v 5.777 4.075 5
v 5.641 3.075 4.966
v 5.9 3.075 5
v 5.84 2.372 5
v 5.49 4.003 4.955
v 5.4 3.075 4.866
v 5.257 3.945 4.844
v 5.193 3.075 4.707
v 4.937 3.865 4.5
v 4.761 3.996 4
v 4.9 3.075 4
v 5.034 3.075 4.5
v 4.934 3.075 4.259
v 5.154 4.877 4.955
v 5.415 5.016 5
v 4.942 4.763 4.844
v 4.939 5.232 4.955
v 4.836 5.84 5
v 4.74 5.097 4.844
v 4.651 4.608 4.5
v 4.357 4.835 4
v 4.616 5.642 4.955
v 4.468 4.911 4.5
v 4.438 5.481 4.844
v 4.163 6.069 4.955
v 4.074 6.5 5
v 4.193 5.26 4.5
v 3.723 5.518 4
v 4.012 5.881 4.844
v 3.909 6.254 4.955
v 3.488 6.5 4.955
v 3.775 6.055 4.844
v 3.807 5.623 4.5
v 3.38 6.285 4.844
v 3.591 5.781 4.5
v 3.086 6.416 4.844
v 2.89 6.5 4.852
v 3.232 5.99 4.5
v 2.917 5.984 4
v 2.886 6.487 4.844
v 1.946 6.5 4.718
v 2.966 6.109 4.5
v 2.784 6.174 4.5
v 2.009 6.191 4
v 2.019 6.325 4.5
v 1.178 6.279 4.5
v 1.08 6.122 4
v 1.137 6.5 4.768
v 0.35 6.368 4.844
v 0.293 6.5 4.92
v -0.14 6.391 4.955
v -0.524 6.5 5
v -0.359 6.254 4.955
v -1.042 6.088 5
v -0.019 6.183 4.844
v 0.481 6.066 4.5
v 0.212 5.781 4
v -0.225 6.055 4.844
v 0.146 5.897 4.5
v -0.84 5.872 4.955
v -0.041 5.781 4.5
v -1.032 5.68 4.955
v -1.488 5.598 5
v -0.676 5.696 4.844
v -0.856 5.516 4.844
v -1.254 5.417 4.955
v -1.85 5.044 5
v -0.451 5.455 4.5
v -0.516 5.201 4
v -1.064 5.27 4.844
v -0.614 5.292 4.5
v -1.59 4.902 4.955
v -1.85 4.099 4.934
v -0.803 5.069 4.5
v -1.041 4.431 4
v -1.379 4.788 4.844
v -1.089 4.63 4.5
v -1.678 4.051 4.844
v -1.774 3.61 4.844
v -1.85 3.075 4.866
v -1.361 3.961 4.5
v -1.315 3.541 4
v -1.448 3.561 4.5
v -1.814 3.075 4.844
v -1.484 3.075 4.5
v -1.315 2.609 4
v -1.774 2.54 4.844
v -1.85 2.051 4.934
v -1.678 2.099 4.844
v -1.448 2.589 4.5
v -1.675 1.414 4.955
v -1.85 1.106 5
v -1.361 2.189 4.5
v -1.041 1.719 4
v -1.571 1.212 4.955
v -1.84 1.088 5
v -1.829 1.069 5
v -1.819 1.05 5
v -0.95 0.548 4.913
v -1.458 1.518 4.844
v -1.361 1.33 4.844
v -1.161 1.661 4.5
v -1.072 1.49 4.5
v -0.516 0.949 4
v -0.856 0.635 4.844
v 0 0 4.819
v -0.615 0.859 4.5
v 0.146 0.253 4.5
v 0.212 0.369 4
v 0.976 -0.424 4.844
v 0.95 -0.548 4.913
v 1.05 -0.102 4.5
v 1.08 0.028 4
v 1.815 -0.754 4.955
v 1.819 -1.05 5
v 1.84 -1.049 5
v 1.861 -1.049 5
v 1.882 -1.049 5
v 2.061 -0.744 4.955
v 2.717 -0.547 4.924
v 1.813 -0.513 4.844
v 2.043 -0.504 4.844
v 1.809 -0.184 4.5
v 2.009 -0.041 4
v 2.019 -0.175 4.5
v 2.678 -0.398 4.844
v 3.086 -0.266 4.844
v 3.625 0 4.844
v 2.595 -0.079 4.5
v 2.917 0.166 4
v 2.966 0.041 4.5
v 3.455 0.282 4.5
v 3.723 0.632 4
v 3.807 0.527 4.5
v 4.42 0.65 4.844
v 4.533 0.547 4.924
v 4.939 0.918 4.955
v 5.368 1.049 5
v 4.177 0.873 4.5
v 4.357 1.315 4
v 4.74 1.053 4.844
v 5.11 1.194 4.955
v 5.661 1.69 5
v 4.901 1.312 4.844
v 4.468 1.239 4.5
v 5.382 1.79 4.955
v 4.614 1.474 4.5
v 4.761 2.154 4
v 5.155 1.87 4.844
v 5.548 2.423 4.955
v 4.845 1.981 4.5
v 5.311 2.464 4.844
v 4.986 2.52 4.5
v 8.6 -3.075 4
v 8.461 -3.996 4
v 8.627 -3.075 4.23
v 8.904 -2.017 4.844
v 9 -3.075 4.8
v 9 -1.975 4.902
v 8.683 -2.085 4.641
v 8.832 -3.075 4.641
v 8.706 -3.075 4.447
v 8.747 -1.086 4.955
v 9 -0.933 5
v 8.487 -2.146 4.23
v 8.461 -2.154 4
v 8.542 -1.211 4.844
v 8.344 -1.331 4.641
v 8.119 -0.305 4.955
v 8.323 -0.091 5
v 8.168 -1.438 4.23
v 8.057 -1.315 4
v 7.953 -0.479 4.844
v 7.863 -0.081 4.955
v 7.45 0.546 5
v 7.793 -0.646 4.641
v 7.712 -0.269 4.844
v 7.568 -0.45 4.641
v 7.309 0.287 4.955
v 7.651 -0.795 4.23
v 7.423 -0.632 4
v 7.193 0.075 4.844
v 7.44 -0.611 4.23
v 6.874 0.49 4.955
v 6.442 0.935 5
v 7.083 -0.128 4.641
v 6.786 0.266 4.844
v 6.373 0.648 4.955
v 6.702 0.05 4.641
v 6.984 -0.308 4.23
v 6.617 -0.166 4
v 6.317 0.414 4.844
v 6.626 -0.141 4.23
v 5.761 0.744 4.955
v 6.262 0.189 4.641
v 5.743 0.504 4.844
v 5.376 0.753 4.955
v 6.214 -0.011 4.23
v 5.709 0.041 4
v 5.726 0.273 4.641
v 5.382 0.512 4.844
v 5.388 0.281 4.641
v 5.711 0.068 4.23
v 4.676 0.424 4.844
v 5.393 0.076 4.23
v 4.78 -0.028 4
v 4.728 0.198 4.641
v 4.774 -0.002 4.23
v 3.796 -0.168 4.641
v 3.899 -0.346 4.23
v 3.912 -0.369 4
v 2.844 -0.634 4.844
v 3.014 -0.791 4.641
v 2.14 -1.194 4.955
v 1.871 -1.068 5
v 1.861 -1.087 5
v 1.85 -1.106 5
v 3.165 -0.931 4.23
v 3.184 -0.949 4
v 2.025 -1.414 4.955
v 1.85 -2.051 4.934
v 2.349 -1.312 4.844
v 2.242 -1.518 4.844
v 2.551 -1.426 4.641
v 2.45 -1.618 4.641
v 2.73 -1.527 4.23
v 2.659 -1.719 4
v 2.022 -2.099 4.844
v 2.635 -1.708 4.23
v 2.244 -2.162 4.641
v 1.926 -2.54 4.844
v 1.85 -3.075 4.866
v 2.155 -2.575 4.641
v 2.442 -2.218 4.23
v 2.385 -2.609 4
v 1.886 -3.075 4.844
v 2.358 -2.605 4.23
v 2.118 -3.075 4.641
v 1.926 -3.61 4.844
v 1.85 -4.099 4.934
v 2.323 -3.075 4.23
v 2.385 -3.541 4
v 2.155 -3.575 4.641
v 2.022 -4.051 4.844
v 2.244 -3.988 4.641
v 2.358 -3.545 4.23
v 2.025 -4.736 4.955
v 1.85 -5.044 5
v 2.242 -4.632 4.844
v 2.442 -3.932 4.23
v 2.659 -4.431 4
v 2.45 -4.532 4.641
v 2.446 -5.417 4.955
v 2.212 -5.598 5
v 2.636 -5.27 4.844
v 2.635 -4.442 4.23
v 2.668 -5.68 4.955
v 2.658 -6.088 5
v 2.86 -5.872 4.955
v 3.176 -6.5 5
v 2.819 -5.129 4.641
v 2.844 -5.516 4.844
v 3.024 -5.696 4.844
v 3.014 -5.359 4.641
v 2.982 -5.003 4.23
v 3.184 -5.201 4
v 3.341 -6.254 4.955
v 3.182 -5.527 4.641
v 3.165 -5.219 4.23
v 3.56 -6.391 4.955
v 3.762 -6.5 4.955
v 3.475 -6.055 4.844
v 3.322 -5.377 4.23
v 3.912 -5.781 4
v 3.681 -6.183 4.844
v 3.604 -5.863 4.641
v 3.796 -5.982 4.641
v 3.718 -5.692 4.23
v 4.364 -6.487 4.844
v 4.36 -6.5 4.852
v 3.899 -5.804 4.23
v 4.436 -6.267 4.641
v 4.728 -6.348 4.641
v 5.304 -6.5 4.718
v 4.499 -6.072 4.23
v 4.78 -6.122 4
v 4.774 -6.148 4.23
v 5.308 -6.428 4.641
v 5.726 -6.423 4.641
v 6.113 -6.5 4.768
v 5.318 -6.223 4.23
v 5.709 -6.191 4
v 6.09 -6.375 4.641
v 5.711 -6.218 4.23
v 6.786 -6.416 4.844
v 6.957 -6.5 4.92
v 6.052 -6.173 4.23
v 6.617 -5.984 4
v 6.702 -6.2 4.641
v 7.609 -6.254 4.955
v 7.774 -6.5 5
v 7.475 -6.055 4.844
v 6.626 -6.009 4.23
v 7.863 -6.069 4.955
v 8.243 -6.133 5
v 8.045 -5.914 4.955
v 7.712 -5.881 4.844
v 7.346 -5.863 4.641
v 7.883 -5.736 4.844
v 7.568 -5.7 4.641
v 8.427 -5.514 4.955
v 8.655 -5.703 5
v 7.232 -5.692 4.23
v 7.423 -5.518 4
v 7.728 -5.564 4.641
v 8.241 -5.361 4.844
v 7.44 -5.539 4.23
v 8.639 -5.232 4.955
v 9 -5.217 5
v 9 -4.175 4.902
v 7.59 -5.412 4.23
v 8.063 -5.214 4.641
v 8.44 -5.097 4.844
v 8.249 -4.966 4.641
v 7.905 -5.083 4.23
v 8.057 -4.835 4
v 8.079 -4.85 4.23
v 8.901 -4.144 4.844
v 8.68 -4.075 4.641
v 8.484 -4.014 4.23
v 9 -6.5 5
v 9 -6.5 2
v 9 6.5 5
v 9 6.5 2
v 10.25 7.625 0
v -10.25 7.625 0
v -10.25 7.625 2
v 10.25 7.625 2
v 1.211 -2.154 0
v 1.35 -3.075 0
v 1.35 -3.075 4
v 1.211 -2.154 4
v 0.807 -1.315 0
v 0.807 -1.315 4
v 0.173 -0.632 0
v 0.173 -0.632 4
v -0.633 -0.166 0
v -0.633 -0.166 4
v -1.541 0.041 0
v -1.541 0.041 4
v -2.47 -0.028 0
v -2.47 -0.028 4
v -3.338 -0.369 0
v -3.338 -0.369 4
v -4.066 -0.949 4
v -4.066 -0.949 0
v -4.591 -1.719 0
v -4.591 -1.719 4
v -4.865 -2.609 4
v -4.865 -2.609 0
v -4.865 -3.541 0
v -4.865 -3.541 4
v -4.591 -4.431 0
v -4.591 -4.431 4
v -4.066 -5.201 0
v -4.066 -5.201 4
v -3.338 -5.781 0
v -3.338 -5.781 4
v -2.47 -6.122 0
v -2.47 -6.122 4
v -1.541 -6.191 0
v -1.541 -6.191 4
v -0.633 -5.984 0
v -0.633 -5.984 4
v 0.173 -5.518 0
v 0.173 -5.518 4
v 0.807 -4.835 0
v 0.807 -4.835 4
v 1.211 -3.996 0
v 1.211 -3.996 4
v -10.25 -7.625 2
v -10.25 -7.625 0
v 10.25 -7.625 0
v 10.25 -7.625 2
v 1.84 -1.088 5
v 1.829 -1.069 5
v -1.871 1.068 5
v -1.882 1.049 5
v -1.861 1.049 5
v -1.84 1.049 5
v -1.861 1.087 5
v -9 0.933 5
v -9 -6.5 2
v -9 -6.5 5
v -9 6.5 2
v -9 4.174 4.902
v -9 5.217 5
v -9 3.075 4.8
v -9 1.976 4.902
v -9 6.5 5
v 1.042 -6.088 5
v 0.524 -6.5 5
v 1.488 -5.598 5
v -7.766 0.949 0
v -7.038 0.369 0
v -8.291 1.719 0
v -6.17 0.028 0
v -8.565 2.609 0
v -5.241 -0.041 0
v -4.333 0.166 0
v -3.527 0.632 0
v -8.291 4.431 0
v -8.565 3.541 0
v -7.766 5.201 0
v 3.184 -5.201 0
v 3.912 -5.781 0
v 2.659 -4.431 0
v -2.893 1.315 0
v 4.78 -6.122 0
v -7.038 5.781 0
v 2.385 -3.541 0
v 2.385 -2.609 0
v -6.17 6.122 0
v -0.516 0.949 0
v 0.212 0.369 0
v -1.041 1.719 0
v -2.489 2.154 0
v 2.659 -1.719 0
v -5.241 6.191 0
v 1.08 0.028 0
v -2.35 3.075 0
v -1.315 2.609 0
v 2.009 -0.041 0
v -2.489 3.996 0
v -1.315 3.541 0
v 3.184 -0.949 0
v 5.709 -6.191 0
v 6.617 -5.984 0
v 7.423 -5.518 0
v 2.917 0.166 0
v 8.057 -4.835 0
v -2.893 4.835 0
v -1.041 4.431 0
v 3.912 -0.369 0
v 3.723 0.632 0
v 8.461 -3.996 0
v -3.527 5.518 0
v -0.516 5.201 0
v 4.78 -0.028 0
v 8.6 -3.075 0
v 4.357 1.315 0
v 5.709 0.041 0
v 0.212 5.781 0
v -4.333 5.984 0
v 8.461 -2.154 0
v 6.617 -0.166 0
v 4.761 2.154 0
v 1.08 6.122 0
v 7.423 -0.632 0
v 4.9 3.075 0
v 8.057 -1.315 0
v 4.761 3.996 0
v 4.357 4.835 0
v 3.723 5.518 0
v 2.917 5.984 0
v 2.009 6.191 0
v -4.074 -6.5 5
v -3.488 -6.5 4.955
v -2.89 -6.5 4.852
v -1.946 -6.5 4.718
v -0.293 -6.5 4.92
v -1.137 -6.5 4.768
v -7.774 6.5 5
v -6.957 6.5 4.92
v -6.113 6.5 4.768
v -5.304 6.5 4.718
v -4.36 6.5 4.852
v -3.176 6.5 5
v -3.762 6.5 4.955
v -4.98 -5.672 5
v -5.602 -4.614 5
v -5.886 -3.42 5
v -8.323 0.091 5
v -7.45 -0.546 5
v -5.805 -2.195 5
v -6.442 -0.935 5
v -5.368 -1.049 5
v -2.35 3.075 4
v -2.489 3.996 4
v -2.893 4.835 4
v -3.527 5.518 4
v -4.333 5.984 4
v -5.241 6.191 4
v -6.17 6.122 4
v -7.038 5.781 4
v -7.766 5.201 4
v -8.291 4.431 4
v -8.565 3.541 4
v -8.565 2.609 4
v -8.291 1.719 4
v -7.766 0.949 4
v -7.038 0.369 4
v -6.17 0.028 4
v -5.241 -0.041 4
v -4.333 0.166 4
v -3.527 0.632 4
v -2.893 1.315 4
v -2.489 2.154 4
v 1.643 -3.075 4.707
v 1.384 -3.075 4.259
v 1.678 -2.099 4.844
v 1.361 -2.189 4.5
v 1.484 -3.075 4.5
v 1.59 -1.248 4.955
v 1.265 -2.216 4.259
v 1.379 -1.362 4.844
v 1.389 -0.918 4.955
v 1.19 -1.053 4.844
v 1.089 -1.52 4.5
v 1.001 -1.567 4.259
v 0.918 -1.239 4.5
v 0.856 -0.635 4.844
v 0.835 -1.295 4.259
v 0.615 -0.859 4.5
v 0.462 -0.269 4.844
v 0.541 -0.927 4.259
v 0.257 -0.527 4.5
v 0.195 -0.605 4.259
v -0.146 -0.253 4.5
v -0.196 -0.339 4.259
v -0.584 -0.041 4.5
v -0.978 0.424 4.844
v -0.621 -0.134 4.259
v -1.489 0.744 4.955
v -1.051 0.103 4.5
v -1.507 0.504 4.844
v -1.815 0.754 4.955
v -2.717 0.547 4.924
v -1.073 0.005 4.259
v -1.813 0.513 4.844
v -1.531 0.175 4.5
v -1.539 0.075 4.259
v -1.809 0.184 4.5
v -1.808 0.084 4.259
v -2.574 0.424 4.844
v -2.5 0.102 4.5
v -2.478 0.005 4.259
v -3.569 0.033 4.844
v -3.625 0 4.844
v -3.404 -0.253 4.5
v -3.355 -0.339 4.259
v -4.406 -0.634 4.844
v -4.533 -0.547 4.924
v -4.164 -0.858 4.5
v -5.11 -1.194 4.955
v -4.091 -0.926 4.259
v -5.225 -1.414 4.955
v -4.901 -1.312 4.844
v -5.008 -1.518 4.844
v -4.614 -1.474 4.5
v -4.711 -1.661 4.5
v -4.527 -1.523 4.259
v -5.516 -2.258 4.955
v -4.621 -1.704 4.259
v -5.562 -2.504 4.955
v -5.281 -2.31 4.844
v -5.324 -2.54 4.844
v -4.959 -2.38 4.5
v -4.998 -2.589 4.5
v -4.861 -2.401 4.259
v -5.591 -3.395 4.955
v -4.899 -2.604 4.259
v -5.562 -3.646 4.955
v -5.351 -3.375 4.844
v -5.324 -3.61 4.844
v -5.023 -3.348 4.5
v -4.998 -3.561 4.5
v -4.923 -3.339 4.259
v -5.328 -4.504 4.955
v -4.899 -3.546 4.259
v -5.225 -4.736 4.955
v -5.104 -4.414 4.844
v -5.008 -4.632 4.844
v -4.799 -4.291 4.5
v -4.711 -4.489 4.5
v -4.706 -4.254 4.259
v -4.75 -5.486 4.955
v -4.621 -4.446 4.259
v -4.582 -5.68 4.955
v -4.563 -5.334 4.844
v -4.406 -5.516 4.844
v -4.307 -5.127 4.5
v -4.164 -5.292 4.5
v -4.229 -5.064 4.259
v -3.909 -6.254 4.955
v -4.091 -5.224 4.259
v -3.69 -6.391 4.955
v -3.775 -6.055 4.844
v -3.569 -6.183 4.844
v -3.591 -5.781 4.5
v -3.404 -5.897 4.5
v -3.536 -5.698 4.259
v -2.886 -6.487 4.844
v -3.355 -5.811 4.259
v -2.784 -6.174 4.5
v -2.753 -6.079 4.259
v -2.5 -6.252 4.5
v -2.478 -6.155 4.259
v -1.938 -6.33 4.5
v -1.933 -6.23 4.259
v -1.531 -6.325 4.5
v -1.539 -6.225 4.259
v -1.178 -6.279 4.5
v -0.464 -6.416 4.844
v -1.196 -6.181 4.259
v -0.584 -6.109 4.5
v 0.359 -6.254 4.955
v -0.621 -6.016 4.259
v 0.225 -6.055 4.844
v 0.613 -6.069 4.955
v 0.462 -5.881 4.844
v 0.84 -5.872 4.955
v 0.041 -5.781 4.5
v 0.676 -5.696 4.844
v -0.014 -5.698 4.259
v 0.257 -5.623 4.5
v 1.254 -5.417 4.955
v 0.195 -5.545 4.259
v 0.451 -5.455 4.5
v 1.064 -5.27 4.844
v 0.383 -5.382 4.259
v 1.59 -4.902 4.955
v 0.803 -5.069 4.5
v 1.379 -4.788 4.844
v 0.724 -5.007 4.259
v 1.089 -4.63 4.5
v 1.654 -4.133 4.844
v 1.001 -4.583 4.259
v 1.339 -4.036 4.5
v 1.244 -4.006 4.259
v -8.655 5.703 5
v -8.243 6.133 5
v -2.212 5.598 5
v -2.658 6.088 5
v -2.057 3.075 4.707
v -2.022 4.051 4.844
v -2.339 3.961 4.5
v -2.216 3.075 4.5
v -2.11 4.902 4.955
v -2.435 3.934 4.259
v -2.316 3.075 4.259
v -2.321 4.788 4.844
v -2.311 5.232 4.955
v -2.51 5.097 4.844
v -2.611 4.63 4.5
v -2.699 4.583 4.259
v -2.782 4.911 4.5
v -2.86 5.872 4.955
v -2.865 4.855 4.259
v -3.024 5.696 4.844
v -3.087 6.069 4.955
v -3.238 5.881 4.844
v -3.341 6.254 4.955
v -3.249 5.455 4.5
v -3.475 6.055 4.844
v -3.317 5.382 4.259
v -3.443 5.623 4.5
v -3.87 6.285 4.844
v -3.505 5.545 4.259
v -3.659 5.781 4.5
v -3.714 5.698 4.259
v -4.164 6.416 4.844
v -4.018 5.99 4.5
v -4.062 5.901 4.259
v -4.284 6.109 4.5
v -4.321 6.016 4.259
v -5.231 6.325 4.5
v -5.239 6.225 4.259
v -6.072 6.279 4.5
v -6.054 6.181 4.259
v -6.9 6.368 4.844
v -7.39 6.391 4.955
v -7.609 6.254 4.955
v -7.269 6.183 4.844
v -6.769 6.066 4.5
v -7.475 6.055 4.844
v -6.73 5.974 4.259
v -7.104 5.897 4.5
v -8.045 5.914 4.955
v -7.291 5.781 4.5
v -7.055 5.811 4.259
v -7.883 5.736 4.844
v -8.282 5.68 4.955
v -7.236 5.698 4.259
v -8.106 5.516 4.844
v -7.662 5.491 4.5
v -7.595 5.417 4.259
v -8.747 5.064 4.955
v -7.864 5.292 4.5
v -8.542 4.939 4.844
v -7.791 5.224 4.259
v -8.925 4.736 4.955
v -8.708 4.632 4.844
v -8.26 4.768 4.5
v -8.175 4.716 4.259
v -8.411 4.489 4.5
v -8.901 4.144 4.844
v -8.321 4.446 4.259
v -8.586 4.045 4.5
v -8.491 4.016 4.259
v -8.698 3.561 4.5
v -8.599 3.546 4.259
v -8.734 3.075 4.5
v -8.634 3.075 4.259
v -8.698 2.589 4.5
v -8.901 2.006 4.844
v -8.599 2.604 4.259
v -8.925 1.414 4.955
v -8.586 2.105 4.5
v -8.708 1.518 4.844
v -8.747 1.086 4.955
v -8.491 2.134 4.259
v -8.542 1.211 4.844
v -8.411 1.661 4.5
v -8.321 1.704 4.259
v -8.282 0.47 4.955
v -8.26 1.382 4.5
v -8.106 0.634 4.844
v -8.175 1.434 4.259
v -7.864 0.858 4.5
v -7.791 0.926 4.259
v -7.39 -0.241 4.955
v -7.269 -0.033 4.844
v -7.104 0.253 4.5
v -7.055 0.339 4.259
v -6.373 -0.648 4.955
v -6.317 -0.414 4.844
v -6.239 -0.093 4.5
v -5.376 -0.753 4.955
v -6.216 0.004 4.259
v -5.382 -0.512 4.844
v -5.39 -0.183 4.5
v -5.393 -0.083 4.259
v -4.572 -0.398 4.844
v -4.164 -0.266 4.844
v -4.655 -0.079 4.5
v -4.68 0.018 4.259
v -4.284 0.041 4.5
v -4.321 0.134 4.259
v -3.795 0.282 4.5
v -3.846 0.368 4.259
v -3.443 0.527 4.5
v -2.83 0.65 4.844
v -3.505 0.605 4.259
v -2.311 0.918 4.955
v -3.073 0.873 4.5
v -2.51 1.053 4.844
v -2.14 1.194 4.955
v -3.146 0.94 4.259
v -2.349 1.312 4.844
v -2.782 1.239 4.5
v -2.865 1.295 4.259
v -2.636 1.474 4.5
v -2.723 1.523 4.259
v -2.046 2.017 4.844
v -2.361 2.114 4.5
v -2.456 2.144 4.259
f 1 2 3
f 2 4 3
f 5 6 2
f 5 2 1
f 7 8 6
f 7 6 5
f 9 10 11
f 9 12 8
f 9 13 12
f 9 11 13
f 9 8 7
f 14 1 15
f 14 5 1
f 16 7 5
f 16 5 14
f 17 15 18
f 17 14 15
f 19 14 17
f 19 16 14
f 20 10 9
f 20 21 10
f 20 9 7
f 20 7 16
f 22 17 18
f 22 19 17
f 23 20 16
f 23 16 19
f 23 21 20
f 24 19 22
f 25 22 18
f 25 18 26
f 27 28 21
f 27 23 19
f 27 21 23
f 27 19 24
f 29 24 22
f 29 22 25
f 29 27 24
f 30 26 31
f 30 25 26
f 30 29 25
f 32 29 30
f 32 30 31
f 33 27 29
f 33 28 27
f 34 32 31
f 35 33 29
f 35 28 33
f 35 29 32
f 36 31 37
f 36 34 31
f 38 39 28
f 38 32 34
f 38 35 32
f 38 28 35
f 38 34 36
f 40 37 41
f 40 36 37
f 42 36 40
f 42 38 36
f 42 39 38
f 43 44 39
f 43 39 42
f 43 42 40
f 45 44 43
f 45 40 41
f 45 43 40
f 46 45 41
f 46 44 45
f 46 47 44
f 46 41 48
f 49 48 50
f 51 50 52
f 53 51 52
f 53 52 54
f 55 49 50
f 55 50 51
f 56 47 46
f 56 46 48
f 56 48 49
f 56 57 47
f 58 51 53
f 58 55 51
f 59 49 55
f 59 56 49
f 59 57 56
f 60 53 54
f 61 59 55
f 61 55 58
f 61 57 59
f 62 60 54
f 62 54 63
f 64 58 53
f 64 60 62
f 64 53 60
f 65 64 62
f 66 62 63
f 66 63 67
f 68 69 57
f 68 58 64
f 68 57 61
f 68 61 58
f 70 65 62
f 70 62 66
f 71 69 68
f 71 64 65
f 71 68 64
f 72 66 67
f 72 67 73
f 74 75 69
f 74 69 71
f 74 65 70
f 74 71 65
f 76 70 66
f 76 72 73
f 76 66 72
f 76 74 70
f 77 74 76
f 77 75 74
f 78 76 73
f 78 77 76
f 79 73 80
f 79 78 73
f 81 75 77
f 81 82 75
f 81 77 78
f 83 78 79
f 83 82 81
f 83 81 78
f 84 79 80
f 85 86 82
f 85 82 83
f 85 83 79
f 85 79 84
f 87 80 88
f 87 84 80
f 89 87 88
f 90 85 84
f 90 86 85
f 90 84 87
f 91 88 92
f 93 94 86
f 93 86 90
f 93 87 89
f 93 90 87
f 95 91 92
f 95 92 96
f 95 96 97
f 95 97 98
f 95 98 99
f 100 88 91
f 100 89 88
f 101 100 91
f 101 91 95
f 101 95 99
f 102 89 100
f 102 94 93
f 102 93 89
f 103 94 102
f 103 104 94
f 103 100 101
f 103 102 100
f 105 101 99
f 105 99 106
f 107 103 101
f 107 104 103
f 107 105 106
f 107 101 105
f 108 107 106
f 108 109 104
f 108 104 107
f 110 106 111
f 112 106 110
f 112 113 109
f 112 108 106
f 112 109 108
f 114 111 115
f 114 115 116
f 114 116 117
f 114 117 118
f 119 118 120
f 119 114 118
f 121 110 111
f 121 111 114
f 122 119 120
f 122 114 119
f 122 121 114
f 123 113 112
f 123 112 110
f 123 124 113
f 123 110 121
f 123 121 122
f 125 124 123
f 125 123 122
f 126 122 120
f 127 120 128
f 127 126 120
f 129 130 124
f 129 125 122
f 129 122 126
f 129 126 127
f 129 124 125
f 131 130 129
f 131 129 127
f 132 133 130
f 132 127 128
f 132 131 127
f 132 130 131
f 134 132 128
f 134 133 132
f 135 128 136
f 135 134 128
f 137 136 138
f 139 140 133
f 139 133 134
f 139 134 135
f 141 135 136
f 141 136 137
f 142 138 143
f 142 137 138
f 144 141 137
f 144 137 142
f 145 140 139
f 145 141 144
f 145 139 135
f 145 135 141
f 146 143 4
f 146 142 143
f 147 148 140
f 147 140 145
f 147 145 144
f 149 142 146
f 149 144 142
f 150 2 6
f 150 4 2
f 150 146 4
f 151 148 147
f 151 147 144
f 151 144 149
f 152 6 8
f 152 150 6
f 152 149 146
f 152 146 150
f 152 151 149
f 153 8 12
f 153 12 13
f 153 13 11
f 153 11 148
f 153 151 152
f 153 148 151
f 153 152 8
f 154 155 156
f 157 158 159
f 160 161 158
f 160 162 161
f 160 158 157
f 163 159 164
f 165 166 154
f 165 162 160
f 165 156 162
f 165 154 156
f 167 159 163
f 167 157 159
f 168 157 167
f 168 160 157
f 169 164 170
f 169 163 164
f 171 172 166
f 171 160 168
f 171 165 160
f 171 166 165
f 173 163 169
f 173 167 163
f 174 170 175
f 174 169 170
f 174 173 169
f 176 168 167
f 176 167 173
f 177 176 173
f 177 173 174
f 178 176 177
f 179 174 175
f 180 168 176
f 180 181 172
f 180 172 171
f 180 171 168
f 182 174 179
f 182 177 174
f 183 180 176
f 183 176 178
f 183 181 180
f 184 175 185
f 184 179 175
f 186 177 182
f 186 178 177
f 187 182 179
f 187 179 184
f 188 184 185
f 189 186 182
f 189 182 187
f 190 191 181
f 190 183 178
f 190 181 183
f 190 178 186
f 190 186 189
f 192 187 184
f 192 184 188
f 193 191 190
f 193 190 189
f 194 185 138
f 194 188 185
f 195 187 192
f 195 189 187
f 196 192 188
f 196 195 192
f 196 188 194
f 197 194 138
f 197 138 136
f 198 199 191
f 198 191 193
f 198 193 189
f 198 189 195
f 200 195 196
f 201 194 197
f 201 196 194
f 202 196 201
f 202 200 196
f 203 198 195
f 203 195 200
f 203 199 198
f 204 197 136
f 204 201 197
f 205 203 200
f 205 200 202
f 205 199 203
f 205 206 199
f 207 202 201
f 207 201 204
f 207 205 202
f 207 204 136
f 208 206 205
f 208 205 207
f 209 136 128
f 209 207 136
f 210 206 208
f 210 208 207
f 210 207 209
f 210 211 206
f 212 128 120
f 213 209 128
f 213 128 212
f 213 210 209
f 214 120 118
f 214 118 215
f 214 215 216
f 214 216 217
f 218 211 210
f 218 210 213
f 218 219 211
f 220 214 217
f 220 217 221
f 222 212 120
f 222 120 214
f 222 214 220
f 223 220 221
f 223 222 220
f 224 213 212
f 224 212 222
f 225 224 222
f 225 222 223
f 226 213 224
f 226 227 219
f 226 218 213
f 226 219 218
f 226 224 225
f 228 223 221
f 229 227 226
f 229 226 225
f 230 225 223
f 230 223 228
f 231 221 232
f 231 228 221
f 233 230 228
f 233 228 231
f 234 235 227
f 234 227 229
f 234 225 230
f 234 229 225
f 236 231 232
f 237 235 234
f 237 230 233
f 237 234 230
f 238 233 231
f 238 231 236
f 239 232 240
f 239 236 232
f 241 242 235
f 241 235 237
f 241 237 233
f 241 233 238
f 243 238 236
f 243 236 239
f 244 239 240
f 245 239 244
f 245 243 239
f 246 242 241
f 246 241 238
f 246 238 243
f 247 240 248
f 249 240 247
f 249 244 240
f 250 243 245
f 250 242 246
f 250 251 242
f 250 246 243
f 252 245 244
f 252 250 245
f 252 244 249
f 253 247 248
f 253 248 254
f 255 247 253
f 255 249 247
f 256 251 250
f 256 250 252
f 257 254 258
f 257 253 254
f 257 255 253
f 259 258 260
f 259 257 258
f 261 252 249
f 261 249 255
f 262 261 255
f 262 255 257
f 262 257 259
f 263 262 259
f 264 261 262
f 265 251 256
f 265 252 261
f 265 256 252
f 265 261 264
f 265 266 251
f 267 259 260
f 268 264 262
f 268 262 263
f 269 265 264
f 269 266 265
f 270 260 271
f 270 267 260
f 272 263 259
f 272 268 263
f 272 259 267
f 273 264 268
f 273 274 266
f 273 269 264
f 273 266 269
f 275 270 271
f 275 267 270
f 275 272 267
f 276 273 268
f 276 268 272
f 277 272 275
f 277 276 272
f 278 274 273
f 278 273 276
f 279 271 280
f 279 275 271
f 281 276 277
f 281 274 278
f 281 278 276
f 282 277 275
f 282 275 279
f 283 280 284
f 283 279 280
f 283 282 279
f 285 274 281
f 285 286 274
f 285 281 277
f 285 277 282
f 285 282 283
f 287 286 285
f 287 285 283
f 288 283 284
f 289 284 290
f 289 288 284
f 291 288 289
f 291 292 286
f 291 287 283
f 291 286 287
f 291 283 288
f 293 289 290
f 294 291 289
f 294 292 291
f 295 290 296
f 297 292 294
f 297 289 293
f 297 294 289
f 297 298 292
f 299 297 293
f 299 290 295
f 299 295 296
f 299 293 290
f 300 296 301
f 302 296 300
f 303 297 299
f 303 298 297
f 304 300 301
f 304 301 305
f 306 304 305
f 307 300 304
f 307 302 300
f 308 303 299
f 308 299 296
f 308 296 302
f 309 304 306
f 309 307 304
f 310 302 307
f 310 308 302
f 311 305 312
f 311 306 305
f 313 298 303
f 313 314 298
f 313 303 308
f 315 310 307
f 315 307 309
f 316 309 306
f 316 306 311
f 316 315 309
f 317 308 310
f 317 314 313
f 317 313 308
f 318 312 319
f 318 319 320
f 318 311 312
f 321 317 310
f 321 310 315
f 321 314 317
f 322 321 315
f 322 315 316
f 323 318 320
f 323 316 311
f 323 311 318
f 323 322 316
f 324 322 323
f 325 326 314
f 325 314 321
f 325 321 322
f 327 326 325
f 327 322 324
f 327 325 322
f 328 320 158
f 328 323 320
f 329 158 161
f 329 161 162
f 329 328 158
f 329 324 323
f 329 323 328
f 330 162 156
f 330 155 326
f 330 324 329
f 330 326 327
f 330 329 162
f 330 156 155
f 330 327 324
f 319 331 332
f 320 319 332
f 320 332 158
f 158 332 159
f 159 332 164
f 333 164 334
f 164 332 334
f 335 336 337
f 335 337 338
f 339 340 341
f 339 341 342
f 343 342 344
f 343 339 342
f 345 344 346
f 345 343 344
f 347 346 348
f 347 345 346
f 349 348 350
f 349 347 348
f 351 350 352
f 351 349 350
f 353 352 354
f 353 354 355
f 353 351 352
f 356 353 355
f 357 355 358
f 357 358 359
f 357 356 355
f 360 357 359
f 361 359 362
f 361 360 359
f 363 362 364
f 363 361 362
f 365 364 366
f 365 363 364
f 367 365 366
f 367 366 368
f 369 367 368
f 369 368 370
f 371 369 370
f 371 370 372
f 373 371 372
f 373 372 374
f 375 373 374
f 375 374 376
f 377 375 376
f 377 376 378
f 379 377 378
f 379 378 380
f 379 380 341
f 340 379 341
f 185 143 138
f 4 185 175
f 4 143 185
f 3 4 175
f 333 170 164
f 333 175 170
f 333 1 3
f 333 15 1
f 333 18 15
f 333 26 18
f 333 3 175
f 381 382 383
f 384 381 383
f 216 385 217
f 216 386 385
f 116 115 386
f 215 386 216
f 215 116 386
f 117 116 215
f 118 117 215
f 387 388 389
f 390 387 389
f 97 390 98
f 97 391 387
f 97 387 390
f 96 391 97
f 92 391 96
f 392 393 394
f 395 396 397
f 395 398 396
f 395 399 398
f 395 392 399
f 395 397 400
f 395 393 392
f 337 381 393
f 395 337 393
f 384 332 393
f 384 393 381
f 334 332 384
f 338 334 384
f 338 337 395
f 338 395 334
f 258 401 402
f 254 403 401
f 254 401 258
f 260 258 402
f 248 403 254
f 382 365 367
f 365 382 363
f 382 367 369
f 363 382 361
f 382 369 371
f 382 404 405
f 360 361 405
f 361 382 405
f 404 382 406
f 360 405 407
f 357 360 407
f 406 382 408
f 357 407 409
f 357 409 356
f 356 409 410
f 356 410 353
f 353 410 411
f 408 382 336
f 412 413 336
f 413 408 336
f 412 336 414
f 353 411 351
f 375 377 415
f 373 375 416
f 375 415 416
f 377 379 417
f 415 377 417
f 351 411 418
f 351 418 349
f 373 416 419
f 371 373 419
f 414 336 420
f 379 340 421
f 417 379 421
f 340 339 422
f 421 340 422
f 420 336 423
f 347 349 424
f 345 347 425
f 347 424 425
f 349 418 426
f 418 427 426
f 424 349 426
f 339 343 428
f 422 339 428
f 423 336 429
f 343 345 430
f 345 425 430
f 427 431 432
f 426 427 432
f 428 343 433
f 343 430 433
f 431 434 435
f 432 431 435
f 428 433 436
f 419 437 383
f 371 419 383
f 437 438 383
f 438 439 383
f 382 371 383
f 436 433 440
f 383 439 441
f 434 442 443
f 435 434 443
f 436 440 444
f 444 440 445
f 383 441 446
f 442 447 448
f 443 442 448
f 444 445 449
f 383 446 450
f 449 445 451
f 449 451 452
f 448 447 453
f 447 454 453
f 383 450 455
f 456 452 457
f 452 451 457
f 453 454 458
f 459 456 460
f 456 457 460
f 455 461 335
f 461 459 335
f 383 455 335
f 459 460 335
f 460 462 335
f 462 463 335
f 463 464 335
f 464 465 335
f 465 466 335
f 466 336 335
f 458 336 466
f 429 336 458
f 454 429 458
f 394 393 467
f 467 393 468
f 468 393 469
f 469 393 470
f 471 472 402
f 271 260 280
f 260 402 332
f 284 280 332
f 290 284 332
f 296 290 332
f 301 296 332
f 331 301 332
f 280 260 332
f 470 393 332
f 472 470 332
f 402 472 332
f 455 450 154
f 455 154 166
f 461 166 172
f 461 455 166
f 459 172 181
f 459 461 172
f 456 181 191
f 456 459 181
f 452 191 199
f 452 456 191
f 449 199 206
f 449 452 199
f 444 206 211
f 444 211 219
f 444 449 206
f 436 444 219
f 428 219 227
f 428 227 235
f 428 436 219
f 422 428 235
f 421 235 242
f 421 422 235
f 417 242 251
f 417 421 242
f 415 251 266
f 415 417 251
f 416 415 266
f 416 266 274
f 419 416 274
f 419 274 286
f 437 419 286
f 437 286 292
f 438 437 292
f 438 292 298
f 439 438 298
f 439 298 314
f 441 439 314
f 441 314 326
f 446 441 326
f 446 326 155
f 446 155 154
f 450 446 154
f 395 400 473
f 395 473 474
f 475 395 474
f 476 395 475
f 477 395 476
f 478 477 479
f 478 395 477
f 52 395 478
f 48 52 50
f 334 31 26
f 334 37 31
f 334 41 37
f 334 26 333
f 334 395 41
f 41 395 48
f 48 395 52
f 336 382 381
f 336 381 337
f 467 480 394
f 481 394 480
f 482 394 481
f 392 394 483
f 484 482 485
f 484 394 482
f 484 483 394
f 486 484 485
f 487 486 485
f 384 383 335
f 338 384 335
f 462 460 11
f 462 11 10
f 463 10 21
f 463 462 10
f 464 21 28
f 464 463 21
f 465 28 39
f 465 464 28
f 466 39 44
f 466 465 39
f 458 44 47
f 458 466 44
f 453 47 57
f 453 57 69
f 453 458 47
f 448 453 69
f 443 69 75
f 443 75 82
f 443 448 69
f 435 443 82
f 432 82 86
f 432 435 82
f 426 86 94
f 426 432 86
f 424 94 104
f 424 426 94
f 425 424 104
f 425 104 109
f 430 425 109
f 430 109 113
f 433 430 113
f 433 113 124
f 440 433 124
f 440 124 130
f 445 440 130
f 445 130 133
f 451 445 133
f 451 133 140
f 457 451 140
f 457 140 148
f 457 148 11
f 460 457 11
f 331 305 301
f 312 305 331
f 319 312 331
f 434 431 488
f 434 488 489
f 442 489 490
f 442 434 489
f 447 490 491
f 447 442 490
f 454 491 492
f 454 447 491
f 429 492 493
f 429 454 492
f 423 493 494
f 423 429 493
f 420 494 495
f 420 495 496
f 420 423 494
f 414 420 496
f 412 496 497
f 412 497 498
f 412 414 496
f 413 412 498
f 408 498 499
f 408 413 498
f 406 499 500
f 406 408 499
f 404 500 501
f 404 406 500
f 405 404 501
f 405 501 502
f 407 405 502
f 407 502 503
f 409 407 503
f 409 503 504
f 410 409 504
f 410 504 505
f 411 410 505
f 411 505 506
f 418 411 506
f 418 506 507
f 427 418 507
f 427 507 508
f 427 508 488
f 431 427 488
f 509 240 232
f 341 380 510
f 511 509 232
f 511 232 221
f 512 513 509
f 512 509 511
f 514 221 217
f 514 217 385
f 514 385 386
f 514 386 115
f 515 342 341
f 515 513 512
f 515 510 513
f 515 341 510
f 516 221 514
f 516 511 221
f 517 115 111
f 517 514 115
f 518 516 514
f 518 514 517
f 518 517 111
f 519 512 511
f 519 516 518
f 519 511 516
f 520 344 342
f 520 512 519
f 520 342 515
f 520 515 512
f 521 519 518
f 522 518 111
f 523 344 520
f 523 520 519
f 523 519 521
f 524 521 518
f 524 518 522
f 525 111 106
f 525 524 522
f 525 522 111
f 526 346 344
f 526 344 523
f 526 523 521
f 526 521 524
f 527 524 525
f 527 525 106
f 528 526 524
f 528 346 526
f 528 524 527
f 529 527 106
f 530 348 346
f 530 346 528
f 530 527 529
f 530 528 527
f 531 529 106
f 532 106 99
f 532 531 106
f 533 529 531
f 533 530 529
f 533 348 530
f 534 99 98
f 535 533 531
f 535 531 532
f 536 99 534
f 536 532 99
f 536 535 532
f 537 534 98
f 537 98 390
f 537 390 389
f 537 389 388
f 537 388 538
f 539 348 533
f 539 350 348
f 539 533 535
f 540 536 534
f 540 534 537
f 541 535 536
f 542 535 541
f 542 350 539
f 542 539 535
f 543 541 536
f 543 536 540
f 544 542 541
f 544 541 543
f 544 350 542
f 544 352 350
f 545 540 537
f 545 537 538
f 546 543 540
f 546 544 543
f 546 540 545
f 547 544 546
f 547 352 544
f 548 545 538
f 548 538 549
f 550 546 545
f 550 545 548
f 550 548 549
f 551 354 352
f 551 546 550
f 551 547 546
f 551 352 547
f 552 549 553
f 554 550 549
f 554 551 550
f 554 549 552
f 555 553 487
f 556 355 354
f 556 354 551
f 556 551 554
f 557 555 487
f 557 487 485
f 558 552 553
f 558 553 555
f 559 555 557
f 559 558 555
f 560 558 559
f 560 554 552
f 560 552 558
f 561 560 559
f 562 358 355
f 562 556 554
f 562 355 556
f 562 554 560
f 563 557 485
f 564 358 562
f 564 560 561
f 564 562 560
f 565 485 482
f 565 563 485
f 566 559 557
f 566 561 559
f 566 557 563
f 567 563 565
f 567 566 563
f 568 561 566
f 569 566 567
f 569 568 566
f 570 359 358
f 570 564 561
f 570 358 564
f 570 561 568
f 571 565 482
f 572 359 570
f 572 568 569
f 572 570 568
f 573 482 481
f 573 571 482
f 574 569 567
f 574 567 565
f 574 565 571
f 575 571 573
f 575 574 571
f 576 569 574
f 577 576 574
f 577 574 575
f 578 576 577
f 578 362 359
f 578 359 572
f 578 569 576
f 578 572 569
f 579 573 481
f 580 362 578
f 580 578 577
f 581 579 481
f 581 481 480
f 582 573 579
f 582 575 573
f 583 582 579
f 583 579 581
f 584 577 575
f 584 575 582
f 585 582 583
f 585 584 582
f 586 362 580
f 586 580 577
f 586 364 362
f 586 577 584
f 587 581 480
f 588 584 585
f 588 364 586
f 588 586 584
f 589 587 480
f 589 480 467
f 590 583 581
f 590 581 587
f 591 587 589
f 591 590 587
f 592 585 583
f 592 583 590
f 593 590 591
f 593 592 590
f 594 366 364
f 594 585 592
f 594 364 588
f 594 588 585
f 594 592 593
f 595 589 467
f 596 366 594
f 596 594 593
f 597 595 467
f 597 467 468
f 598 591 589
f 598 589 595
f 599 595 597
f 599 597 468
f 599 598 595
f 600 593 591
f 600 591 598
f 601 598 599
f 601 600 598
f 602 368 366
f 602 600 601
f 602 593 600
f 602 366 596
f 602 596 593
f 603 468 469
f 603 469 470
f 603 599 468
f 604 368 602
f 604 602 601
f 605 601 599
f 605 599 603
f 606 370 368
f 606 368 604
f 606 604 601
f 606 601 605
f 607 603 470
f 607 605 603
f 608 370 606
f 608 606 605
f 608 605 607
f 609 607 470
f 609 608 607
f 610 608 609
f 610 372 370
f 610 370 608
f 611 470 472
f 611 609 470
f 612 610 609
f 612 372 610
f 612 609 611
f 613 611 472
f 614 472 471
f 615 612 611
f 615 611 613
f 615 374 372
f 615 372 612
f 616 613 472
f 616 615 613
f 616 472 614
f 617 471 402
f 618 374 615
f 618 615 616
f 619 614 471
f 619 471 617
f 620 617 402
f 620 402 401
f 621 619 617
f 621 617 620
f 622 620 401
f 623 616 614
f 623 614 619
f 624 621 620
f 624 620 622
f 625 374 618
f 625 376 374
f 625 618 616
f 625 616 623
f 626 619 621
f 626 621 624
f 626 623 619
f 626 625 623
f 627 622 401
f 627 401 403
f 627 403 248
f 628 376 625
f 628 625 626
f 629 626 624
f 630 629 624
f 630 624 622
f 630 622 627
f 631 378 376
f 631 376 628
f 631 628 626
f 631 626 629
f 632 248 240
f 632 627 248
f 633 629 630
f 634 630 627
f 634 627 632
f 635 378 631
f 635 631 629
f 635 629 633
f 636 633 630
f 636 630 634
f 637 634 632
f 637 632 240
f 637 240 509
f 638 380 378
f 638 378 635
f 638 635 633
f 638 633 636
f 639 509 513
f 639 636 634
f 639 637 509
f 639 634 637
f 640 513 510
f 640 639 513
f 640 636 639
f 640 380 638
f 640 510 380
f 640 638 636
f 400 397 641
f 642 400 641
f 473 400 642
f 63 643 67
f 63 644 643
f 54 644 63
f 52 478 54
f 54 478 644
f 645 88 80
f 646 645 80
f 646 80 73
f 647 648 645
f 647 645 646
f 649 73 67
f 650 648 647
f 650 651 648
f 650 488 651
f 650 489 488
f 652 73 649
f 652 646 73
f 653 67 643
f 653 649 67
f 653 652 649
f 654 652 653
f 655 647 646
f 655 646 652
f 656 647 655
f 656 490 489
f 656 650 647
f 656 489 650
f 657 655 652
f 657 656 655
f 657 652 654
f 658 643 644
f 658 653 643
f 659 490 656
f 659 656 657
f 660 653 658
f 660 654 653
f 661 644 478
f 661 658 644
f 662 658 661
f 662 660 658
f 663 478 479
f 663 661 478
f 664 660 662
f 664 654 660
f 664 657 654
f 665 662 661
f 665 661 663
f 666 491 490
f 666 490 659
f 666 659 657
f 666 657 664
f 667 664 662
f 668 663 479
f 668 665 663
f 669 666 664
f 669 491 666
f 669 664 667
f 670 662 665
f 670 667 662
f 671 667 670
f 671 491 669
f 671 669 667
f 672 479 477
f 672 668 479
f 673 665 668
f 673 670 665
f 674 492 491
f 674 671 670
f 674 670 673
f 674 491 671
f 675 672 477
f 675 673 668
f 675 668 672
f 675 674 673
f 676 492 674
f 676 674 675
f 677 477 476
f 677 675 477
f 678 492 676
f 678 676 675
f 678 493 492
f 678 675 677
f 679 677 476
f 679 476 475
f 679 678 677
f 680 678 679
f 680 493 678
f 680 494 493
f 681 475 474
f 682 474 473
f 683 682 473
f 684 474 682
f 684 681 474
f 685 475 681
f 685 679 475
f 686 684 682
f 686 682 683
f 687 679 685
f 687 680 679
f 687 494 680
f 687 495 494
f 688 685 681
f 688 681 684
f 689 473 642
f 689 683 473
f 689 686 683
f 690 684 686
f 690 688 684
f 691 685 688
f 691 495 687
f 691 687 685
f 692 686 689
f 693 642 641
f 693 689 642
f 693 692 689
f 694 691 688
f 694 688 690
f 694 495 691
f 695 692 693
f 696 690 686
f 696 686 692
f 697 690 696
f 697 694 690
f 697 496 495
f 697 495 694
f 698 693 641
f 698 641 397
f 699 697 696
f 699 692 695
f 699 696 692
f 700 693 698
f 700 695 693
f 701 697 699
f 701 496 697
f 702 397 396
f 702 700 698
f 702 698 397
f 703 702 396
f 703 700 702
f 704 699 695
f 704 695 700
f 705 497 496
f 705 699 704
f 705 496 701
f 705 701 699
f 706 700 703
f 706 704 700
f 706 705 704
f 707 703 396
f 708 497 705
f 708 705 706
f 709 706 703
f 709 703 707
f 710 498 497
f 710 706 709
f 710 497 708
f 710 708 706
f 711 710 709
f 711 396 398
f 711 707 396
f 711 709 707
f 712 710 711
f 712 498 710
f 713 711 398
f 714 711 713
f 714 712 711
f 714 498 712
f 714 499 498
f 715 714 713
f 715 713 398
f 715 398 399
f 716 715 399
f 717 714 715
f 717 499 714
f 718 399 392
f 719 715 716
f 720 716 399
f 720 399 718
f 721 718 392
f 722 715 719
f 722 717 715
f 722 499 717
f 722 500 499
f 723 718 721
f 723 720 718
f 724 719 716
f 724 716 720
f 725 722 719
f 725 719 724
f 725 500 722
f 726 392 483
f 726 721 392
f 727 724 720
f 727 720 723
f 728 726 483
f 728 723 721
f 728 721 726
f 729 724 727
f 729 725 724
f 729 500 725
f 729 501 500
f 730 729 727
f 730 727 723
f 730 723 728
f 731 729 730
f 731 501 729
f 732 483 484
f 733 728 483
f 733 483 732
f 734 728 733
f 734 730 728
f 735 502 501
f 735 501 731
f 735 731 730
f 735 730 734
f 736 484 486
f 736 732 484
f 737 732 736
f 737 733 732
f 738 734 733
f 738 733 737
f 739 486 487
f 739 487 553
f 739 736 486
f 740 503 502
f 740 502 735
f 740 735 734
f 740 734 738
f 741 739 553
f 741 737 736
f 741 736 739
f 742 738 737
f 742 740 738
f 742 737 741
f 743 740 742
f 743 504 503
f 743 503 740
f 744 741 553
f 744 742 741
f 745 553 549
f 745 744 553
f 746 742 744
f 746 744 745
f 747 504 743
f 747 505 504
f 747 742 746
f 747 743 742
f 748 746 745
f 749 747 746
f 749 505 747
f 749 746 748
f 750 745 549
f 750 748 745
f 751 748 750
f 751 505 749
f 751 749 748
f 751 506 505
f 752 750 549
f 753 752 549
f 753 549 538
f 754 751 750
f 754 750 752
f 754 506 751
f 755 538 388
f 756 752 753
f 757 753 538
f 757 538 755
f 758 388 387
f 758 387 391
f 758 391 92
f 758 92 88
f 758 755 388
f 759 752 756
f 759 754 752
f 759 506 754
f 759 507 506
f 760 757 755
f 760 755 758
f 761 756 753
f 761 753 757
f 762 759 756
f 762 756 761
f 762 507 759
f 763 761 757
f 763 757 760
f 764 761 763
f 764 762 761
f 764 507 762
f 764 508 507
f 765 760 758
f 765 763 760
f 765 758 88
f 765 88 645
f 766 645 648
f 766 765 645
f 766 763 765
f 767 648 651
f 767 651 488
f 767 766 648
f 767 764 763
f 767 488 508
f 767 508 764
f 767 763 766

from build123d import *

# Parameters (mm, degrees)
F0_W     = 20.5
F0_H     = 15.25
F0_W_2   = 18
F0_H_2   = 13
F0_R     = 3.125
F1_DEPTH = 2
F2_DEPTH = 5


# Not quite as in the source:
# - a fillet or chamfer that OpenCascade refuses, or shapes differently, is made with other operations: its cross-section is extruded or revolved along the edge and cut away or added


with BuildPart() as f1:
    # F0 (on Top) → F1 (new body)
    with BuildSketch(Plane.XY):
        Rectangle(F0_W, F0_H)
        Rectangle(F0_W_2, F0_H_2, mode=Mode.SUBTRACT)
        Rectangle(F0_W_2, F0_H_2)
        with Locations((-1.775, -3.075)):
            Circle(F0_R, mode=Mode.SUBTRACT)
        with Locations((5.475, -3.075)):
            Circle(F0_R, mode=Mode.SUBTRACT)
        with Locations((-5.475, 3.075)):
            Circle(F0_R, mode=Mode.SUBTRACT)
        with Locations((1.775, 3.075)):
            Circle(F0_R, mode=Mode.SUBTRACT)
    extrude(amount=F1_DEPTH)

    # F0 (on Top) → F2 (join)
    with BuildSketch(Plane.XY):
        Rectangle(F0_W_2, F0_H_2)
        with Locations((-1.775, -3.075)):
            Circle(F0_R, mode=Mode.SUBTRACT)
        with Locations((5.475, -3.075)):
            Circle(F0_R, mode=Mode.SUBTRACT)
        with Locations((-5.475, 3.075)):
            Circle(F0_R, mode=Mode.SUBTRACT)
        with Locations((1.775, 3.075)):
            Circle(F0_R, mode=Mode.SUBTRACT)
    extrude(amount=F2_DEPTH)

    # F3: fillet of radius 1 on 4 edges, made by hand

    # F3_s1 → F3_t2 (revolve, cut)
    with BuildSketch(Plane.XZ.offset(-3.075)):
        with BuildLine():
            ThreePointArc((-1.35, 5), (-2.0571067812, 4.7071067812), (-2.35, 4))
            Line((-2.35, 4), (-2.35, 5))
            Line((-2.35, 5), (-1.35, 5))
        make_face()
    revolve(axis=Axis((-5.475, 3.075, 5), (0, 0, 1)), mode=Mode.SUBTRACT)

    # F3_s3 → F3_t4 (revolve, cut)
    with BuildSketch(Plane.XZ.offset(-3.075)):
        with BuildLine():
            ThreePointArc((5.9, 5), (5.1928932188, 4.7071067812), (4.9, 4))
            Line((4.9, 4), (4.9, 5))
            Line((4.9, 5), (5.9, 5))
        make_face()
    revolve(axis=Axis((1.775, 3.075, 5), (0, 0, 1)), mode=Mode.SUBTRACT)

    # F3_s5 → F3_t6 (revolve, cut)
    with BuildSketch(Plane.XZ.offset(3.075)):
        with BuildLine():
            ThreePointArc((2.35, 5), (1.6428932188, 4.7071067812), (1.35, 4))
            Line((1.35, 4), (1.35, 5))
            Line((1.35, 5), (2.35, 5))
        make_face()
    revolve(axis=Axis((-1.775, -3.075, 5), (0, 0, 1)), mode=Mode.SUBTRACT)

    # F3_s7 → F3_t8 (revolve, cut)
    with BuildSketch(Plane.XZ.offset(3.075)):
        with BuildLine():
            ThreePointArc((9.6, 5), (8.8928932188, 4.7071067812), (8.6, 4))
            Line((8.6, 4), (8.6, 5))
            Line((8.6, 5), (9.6, 5))
        make_face()
    revolve(axis=Axis((5.475, -3.075, 5), (0, 0, 1)), mode=Mode.SUBTRACT)


solid = f1.part
